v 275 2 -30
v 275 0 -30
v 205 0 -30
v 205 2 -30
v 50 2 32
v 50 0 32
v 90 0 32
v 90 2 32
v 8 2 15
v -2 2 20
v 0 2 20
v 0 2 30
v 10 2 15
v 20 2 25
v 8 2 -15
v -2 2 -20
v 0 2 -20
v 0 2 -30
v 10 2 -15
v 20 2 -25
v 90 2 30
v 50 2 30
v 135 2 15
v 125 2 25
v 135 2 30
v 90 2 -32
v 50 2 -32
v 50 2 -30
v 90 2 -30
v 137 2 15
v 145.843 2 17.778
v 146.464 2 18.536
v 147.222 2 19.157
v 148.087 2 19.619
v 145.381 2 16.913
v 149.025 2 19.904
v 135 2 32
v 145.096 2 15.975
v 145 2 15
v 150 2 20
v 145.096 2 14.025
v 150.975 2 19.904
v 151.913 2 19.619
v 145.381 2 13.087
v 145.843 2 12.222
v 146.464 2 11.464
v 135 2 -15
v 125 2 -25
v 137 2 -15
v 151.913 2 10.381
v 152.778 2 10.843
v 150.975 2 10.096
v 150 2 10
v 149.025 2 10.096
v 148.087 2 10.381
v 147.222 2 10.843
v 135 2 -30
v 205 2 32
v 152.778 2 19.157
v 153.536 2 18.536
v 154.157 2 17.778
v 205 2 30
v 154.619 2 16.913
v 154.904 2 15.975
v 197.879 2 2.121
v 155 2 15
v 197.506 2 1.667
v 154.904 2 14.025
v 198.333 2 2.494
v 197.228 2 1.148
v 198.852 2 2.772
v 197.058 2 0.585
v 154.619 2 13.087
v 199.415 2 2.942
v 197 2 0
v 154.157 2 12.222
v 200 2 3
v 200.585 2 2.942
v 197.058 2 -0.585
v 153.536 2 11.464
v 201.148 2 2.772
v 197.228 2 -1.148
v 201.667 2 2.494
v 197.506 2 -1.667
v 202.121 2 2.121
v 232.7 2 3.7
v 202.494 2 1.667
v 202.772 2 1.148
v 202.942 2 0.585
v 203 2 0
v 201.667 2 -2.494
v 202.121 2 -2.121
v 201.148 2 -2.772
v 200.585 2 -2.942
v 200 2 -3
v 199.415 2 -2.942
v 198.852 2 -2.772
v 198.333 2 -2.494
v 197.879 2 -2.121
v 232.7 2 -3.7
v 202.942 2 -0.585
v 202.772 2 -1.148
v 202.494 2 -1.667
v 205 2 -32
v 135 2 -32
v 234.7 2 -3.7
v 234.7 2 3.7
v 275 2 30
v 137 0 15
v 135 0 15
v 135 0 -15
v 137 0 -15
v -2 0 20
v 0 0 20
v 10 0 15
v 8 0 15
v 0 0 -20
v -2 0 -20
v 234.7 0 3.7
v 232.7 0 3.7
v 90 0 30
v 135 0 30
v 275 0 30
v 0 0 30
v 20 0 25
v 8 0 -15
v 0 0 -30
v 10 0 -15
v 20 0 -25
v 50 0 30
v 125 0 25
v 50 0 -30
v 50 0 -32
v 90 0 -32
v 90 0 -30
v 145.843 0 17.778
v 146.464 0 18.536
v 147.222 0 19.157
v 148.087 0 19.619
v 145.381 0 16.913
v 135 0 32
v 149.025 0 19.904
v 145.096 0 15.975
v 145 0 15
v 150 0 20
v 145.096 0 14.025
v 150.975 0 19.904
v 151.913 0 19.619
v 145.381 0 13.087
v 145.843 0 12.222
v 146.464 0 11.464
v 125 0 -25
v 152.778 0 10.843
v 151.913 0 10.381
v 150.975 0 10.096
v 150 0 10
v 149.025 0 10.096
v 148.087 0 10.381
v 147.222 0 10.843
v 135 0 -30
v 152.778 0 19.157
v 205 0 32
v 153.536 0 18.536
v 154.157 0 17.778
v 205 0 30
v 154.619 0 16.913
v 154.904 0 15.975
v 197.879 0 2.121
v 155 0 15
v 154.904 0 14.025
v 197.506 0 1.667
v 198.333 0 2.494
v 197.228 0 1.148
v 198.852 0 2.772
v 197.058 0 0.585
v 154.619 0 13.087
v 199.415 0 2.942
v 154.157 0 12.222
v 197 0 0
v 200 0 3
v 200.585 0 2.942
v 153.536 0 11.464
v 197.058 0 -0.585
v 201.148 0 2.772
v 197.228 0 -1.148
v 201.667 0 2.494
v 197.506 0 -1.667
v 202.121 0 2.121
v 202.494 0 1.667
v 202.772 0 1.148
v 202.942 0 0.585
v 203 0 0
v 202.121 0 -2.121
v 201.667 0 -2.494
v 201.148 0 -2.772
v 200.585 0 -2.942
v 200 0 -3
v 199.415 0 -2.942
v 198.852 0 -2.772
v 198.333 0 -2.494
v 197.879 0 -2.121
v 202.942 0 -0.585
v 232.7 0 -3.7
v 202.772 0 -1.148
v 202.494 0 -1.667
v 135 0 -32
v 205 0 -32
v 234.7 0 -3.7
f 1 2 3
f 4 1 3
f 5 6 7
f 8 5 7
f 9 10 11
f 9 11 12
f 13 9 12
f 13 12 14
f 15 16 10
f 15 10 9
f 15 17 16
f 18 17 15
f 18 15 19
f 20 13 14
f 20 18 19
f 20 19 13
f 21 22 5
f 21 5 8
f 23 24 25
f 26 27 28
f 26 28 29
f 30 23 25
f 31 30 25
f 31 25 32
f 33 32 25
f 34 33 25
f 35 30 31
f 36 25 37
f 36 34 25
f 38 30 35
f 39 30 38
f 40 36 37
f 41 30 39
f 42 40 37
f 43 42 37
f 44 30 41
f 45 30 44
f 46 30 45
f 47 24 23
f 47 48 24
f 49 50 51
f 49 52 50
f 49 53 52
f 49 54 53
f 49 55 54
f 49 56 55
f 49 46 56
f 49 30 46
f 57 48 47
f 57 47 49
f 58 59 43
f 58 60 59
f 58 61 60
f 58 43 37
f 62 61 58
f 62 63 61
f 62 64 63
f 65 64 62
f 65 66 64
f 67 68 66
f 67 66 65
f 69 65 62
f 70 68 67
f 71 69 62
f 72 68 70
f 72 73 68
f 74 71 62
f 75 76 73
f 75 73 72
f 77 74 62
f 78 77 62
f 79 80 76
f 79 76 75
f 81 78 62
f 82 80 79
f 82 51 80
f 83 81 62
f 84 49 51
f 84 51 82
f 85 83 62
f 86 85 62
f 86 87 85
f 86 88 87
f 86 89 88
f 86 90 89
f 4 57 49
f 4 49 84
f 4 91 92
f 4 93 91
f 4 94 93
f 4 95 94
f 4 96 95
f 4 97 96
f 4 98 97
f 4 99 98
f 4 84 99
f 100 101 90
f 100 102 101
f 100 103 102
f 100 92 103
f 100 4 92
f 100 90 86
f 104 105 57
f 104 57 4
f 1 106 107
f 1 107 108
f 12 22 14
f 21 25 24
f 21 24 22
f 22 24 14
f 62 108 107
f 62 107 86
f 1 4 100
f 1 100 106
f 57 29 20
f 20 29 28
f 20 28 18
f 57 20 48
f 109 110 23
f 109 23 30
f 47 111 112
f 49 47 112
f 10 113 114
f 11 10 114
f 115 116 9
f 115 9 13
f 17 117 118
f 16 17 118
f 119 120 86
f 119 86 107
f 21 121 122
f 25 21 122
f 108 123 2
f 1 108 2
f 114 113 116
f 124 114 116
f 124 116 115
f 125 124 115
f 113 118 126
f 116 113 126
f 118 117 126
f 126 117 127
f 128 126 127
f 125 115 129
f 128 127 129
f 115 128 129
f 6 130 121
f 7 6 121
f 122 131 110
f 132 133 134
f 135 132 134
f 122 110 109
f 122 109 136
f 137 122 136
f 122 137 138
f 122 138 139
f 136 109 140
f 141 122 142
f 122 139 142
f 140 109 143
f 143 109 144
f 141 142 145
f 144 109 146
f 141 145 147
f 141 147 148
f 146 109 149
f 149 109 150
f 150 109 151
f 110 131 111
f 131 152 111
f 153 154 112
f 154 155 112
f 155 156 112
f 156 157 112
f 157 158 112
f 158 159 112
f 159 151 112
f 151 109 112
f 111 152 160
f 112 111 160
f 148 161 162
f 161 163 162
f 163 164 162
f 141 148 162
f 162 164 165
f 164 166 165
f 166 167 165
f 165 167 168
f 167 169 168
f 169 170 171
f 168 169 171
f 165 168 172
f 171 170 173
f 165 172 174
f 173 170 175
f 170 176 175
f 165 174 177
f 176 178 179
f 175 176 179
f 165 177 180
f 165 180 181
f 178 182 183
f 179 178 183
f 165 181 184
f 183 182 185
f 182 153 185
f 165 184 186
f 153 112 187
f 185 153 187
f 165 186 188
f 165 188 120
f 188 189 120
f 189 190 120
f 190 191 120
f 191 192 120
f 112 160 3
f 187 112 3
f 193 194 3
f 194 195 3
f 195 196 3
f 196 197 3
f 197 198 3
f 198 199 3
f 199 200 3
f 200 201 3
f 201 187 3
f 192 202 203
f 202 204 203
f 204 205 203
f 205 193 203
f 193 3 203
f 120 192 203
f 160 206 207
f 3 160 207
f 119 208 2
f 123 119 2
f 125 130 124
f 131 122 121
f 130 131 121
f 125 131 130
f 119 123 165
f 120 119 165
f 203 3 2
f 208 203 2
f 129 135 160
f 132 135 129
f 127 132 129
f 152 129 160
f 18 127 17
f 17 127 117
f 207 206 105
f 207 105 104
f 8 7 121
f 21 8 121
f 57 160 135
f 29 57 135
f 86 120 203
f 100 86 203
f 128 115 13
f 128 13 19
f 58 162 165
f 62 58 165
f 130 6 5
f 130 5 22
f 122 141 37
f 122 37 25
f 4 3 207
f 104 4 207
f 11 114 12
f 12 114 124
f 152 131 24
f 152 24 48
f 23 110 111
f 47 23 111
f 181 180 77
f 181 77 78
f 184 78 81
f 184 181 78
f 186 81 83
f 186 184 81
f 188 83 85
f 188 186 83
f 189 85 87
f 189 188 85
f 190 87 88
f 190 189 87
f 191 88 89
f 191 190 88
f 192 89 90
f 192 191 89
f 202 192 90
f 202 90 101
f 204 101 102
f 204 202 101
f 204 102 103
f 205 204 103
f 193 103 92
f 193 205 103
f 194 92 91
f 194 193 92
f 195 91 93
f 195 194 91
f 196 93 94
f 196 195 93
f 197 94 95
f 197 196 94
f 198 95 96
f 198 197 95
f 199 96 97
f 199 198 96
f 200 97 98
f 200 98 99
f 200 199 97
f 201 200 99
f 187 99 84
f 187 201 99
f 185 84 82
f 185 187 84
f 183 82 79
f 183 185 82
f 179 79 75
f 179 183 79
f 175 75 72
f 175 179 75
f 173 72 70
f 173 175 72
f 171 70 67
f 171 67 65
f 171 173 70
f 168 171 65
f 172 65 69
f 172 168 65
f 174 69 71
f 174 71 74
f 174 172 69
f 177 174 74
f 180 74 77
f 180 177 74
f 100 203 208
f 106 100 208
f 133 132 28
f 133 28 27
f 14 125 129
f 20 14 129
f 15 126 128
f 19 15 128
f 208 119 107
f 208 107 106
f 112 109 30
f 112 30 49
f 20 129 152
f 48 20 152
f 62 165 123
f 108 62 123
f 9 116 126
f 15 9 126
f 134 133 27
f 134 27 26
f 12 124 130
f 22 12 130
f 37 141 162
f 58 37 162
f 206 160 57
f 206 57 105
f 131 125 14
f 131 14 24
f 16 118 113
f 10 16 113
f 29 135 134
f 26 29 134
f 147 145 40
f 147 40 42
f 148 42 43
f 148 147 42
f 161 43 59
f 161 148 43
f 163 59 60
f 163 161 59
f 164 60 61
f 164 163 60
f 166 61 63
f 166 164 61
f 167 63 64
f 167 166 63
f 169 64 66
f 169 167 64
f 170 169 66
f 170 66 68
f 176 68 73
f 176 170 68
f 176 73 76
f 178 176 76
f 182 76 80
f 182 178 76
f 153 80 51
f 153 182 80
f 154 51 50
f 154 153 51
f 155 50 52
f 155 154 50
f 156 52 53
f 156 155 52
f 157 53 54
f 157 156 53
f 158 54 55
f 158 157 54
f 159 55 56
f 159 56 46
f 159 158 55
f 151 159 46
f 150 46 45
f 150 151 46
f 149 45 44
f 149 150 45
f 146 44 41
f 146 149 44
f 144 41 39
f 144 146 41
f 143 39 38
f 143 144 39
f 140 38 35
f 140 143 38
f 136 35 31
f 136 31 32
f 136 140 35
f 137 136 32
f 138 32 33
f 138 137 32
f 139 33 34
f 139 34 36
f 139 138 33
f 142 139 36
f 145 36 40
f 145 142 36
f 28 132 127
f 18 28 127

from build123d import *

# Parameters (mm, degrees)
SKETCH_1_R      = 5
SKETCH_1_W      = 2
SKETCH_1_H      = 30
SKETCH_1_W_2    = 105
SKETCH_1_H_2    = 50
SKETCH_1_R_2    = 3
SKETCH_1_H_3    = 7.4
SKETCH_1_W_3    = 40
SKETCH_1_H_4    = 2
SKETCH_1_W_4    = 70
EXTRUDE_1_DEPTH = 2


with BuildPart() as part:
    # 草图1 → 凸台-拉伸1 (new body)
    # profile 1 of 5: a face of its own
    with BuildSketch(Plane(origin=(0, 0, 0), x_dir=(1, 0, 0), z_dir=(0, 1, 0))):
        Polygon((-2, 20), (-2, -20), (0, -20), (0, -30), (50, -30), (90, -30), (135, -30), (205, -30), (275, -30), (275, 30), (205, 30), (135, 30), (90, 30), (50, 30), (0, 30), (0, 20), align=None)
        with Locations(Location((150, -15, 0), (0, 0, 270))):
            Circle(SKETCH_1_R, mode=Mode.SUBTRACT)
        with Locations((9, 0)):
            Rectangle(SKETCH_1_W, SKETCH_1_H, mode=Mode.SUBTRACT)
        with Locations((72.5, 0)):
            Rectangle(SKETCH_1_W_2, SKETCH_1_H_2, mode=Mode.SUBTRACT)
        with Locations((136, 0)):
            Rectangle(SKETCH_1_W, SKETCH_1_H, mode=Mode.SUBTRACT)
        with Locations(Location((200, 0, 0), (0, 0, 270))):
            Circle(SKETCH_1_R_2, mode=Mode.SUBTRACT)
        with Locations((233.7, 0)):
            Rectangle(SKETCH_1_W, SKETCH_1_H_3, mode=Mode.SUBTRACT)
    # profile 2 of 5: a face of its own
    with BuildSketch(Plane(origin=(0, 0, 0), x_dir=(1, 0, 0), z_dir=(0, 1, 0))):
        with Locations((70, 31)):
            Rectangle(SKETCH_1_W_3, SKETCH_1_H_4)
    # profile 3 of 5: a face of its own
    with BuildSketch(Plane(origin=(0, 0, 0), x_dir=(1, 0, 0), z_dir=(0, 1, 0))):
        with Locations((170, 31)):
            Rectangle(SKETCH_1_W_4, SKETCH_1_H_4)
    # profile 4 of 5: a face of its own
    with BuildSketch(Plane(origin=(0, 0, 0), x_dir=(1, 0, 0), z_dir=(0, 1, 0))):
        with Locations((70, -31)):
            Rectangle(SKETCH_1_W_3, SKETCH_1_H_4)
    # profile 5 of 5: a face of its own
    with BuildSketch(Plane(origin=(0, 0, 0), x_dir=(1, 0, 0), z_dir=(0, 1, 0))):
        with Locations((170, -31)):
            Rectangle(SKETCH_1_W_4, SKETCH_1_H_4)
    extrude(amount=EXTRUDE_1_DEPTH)


solid = part.part
